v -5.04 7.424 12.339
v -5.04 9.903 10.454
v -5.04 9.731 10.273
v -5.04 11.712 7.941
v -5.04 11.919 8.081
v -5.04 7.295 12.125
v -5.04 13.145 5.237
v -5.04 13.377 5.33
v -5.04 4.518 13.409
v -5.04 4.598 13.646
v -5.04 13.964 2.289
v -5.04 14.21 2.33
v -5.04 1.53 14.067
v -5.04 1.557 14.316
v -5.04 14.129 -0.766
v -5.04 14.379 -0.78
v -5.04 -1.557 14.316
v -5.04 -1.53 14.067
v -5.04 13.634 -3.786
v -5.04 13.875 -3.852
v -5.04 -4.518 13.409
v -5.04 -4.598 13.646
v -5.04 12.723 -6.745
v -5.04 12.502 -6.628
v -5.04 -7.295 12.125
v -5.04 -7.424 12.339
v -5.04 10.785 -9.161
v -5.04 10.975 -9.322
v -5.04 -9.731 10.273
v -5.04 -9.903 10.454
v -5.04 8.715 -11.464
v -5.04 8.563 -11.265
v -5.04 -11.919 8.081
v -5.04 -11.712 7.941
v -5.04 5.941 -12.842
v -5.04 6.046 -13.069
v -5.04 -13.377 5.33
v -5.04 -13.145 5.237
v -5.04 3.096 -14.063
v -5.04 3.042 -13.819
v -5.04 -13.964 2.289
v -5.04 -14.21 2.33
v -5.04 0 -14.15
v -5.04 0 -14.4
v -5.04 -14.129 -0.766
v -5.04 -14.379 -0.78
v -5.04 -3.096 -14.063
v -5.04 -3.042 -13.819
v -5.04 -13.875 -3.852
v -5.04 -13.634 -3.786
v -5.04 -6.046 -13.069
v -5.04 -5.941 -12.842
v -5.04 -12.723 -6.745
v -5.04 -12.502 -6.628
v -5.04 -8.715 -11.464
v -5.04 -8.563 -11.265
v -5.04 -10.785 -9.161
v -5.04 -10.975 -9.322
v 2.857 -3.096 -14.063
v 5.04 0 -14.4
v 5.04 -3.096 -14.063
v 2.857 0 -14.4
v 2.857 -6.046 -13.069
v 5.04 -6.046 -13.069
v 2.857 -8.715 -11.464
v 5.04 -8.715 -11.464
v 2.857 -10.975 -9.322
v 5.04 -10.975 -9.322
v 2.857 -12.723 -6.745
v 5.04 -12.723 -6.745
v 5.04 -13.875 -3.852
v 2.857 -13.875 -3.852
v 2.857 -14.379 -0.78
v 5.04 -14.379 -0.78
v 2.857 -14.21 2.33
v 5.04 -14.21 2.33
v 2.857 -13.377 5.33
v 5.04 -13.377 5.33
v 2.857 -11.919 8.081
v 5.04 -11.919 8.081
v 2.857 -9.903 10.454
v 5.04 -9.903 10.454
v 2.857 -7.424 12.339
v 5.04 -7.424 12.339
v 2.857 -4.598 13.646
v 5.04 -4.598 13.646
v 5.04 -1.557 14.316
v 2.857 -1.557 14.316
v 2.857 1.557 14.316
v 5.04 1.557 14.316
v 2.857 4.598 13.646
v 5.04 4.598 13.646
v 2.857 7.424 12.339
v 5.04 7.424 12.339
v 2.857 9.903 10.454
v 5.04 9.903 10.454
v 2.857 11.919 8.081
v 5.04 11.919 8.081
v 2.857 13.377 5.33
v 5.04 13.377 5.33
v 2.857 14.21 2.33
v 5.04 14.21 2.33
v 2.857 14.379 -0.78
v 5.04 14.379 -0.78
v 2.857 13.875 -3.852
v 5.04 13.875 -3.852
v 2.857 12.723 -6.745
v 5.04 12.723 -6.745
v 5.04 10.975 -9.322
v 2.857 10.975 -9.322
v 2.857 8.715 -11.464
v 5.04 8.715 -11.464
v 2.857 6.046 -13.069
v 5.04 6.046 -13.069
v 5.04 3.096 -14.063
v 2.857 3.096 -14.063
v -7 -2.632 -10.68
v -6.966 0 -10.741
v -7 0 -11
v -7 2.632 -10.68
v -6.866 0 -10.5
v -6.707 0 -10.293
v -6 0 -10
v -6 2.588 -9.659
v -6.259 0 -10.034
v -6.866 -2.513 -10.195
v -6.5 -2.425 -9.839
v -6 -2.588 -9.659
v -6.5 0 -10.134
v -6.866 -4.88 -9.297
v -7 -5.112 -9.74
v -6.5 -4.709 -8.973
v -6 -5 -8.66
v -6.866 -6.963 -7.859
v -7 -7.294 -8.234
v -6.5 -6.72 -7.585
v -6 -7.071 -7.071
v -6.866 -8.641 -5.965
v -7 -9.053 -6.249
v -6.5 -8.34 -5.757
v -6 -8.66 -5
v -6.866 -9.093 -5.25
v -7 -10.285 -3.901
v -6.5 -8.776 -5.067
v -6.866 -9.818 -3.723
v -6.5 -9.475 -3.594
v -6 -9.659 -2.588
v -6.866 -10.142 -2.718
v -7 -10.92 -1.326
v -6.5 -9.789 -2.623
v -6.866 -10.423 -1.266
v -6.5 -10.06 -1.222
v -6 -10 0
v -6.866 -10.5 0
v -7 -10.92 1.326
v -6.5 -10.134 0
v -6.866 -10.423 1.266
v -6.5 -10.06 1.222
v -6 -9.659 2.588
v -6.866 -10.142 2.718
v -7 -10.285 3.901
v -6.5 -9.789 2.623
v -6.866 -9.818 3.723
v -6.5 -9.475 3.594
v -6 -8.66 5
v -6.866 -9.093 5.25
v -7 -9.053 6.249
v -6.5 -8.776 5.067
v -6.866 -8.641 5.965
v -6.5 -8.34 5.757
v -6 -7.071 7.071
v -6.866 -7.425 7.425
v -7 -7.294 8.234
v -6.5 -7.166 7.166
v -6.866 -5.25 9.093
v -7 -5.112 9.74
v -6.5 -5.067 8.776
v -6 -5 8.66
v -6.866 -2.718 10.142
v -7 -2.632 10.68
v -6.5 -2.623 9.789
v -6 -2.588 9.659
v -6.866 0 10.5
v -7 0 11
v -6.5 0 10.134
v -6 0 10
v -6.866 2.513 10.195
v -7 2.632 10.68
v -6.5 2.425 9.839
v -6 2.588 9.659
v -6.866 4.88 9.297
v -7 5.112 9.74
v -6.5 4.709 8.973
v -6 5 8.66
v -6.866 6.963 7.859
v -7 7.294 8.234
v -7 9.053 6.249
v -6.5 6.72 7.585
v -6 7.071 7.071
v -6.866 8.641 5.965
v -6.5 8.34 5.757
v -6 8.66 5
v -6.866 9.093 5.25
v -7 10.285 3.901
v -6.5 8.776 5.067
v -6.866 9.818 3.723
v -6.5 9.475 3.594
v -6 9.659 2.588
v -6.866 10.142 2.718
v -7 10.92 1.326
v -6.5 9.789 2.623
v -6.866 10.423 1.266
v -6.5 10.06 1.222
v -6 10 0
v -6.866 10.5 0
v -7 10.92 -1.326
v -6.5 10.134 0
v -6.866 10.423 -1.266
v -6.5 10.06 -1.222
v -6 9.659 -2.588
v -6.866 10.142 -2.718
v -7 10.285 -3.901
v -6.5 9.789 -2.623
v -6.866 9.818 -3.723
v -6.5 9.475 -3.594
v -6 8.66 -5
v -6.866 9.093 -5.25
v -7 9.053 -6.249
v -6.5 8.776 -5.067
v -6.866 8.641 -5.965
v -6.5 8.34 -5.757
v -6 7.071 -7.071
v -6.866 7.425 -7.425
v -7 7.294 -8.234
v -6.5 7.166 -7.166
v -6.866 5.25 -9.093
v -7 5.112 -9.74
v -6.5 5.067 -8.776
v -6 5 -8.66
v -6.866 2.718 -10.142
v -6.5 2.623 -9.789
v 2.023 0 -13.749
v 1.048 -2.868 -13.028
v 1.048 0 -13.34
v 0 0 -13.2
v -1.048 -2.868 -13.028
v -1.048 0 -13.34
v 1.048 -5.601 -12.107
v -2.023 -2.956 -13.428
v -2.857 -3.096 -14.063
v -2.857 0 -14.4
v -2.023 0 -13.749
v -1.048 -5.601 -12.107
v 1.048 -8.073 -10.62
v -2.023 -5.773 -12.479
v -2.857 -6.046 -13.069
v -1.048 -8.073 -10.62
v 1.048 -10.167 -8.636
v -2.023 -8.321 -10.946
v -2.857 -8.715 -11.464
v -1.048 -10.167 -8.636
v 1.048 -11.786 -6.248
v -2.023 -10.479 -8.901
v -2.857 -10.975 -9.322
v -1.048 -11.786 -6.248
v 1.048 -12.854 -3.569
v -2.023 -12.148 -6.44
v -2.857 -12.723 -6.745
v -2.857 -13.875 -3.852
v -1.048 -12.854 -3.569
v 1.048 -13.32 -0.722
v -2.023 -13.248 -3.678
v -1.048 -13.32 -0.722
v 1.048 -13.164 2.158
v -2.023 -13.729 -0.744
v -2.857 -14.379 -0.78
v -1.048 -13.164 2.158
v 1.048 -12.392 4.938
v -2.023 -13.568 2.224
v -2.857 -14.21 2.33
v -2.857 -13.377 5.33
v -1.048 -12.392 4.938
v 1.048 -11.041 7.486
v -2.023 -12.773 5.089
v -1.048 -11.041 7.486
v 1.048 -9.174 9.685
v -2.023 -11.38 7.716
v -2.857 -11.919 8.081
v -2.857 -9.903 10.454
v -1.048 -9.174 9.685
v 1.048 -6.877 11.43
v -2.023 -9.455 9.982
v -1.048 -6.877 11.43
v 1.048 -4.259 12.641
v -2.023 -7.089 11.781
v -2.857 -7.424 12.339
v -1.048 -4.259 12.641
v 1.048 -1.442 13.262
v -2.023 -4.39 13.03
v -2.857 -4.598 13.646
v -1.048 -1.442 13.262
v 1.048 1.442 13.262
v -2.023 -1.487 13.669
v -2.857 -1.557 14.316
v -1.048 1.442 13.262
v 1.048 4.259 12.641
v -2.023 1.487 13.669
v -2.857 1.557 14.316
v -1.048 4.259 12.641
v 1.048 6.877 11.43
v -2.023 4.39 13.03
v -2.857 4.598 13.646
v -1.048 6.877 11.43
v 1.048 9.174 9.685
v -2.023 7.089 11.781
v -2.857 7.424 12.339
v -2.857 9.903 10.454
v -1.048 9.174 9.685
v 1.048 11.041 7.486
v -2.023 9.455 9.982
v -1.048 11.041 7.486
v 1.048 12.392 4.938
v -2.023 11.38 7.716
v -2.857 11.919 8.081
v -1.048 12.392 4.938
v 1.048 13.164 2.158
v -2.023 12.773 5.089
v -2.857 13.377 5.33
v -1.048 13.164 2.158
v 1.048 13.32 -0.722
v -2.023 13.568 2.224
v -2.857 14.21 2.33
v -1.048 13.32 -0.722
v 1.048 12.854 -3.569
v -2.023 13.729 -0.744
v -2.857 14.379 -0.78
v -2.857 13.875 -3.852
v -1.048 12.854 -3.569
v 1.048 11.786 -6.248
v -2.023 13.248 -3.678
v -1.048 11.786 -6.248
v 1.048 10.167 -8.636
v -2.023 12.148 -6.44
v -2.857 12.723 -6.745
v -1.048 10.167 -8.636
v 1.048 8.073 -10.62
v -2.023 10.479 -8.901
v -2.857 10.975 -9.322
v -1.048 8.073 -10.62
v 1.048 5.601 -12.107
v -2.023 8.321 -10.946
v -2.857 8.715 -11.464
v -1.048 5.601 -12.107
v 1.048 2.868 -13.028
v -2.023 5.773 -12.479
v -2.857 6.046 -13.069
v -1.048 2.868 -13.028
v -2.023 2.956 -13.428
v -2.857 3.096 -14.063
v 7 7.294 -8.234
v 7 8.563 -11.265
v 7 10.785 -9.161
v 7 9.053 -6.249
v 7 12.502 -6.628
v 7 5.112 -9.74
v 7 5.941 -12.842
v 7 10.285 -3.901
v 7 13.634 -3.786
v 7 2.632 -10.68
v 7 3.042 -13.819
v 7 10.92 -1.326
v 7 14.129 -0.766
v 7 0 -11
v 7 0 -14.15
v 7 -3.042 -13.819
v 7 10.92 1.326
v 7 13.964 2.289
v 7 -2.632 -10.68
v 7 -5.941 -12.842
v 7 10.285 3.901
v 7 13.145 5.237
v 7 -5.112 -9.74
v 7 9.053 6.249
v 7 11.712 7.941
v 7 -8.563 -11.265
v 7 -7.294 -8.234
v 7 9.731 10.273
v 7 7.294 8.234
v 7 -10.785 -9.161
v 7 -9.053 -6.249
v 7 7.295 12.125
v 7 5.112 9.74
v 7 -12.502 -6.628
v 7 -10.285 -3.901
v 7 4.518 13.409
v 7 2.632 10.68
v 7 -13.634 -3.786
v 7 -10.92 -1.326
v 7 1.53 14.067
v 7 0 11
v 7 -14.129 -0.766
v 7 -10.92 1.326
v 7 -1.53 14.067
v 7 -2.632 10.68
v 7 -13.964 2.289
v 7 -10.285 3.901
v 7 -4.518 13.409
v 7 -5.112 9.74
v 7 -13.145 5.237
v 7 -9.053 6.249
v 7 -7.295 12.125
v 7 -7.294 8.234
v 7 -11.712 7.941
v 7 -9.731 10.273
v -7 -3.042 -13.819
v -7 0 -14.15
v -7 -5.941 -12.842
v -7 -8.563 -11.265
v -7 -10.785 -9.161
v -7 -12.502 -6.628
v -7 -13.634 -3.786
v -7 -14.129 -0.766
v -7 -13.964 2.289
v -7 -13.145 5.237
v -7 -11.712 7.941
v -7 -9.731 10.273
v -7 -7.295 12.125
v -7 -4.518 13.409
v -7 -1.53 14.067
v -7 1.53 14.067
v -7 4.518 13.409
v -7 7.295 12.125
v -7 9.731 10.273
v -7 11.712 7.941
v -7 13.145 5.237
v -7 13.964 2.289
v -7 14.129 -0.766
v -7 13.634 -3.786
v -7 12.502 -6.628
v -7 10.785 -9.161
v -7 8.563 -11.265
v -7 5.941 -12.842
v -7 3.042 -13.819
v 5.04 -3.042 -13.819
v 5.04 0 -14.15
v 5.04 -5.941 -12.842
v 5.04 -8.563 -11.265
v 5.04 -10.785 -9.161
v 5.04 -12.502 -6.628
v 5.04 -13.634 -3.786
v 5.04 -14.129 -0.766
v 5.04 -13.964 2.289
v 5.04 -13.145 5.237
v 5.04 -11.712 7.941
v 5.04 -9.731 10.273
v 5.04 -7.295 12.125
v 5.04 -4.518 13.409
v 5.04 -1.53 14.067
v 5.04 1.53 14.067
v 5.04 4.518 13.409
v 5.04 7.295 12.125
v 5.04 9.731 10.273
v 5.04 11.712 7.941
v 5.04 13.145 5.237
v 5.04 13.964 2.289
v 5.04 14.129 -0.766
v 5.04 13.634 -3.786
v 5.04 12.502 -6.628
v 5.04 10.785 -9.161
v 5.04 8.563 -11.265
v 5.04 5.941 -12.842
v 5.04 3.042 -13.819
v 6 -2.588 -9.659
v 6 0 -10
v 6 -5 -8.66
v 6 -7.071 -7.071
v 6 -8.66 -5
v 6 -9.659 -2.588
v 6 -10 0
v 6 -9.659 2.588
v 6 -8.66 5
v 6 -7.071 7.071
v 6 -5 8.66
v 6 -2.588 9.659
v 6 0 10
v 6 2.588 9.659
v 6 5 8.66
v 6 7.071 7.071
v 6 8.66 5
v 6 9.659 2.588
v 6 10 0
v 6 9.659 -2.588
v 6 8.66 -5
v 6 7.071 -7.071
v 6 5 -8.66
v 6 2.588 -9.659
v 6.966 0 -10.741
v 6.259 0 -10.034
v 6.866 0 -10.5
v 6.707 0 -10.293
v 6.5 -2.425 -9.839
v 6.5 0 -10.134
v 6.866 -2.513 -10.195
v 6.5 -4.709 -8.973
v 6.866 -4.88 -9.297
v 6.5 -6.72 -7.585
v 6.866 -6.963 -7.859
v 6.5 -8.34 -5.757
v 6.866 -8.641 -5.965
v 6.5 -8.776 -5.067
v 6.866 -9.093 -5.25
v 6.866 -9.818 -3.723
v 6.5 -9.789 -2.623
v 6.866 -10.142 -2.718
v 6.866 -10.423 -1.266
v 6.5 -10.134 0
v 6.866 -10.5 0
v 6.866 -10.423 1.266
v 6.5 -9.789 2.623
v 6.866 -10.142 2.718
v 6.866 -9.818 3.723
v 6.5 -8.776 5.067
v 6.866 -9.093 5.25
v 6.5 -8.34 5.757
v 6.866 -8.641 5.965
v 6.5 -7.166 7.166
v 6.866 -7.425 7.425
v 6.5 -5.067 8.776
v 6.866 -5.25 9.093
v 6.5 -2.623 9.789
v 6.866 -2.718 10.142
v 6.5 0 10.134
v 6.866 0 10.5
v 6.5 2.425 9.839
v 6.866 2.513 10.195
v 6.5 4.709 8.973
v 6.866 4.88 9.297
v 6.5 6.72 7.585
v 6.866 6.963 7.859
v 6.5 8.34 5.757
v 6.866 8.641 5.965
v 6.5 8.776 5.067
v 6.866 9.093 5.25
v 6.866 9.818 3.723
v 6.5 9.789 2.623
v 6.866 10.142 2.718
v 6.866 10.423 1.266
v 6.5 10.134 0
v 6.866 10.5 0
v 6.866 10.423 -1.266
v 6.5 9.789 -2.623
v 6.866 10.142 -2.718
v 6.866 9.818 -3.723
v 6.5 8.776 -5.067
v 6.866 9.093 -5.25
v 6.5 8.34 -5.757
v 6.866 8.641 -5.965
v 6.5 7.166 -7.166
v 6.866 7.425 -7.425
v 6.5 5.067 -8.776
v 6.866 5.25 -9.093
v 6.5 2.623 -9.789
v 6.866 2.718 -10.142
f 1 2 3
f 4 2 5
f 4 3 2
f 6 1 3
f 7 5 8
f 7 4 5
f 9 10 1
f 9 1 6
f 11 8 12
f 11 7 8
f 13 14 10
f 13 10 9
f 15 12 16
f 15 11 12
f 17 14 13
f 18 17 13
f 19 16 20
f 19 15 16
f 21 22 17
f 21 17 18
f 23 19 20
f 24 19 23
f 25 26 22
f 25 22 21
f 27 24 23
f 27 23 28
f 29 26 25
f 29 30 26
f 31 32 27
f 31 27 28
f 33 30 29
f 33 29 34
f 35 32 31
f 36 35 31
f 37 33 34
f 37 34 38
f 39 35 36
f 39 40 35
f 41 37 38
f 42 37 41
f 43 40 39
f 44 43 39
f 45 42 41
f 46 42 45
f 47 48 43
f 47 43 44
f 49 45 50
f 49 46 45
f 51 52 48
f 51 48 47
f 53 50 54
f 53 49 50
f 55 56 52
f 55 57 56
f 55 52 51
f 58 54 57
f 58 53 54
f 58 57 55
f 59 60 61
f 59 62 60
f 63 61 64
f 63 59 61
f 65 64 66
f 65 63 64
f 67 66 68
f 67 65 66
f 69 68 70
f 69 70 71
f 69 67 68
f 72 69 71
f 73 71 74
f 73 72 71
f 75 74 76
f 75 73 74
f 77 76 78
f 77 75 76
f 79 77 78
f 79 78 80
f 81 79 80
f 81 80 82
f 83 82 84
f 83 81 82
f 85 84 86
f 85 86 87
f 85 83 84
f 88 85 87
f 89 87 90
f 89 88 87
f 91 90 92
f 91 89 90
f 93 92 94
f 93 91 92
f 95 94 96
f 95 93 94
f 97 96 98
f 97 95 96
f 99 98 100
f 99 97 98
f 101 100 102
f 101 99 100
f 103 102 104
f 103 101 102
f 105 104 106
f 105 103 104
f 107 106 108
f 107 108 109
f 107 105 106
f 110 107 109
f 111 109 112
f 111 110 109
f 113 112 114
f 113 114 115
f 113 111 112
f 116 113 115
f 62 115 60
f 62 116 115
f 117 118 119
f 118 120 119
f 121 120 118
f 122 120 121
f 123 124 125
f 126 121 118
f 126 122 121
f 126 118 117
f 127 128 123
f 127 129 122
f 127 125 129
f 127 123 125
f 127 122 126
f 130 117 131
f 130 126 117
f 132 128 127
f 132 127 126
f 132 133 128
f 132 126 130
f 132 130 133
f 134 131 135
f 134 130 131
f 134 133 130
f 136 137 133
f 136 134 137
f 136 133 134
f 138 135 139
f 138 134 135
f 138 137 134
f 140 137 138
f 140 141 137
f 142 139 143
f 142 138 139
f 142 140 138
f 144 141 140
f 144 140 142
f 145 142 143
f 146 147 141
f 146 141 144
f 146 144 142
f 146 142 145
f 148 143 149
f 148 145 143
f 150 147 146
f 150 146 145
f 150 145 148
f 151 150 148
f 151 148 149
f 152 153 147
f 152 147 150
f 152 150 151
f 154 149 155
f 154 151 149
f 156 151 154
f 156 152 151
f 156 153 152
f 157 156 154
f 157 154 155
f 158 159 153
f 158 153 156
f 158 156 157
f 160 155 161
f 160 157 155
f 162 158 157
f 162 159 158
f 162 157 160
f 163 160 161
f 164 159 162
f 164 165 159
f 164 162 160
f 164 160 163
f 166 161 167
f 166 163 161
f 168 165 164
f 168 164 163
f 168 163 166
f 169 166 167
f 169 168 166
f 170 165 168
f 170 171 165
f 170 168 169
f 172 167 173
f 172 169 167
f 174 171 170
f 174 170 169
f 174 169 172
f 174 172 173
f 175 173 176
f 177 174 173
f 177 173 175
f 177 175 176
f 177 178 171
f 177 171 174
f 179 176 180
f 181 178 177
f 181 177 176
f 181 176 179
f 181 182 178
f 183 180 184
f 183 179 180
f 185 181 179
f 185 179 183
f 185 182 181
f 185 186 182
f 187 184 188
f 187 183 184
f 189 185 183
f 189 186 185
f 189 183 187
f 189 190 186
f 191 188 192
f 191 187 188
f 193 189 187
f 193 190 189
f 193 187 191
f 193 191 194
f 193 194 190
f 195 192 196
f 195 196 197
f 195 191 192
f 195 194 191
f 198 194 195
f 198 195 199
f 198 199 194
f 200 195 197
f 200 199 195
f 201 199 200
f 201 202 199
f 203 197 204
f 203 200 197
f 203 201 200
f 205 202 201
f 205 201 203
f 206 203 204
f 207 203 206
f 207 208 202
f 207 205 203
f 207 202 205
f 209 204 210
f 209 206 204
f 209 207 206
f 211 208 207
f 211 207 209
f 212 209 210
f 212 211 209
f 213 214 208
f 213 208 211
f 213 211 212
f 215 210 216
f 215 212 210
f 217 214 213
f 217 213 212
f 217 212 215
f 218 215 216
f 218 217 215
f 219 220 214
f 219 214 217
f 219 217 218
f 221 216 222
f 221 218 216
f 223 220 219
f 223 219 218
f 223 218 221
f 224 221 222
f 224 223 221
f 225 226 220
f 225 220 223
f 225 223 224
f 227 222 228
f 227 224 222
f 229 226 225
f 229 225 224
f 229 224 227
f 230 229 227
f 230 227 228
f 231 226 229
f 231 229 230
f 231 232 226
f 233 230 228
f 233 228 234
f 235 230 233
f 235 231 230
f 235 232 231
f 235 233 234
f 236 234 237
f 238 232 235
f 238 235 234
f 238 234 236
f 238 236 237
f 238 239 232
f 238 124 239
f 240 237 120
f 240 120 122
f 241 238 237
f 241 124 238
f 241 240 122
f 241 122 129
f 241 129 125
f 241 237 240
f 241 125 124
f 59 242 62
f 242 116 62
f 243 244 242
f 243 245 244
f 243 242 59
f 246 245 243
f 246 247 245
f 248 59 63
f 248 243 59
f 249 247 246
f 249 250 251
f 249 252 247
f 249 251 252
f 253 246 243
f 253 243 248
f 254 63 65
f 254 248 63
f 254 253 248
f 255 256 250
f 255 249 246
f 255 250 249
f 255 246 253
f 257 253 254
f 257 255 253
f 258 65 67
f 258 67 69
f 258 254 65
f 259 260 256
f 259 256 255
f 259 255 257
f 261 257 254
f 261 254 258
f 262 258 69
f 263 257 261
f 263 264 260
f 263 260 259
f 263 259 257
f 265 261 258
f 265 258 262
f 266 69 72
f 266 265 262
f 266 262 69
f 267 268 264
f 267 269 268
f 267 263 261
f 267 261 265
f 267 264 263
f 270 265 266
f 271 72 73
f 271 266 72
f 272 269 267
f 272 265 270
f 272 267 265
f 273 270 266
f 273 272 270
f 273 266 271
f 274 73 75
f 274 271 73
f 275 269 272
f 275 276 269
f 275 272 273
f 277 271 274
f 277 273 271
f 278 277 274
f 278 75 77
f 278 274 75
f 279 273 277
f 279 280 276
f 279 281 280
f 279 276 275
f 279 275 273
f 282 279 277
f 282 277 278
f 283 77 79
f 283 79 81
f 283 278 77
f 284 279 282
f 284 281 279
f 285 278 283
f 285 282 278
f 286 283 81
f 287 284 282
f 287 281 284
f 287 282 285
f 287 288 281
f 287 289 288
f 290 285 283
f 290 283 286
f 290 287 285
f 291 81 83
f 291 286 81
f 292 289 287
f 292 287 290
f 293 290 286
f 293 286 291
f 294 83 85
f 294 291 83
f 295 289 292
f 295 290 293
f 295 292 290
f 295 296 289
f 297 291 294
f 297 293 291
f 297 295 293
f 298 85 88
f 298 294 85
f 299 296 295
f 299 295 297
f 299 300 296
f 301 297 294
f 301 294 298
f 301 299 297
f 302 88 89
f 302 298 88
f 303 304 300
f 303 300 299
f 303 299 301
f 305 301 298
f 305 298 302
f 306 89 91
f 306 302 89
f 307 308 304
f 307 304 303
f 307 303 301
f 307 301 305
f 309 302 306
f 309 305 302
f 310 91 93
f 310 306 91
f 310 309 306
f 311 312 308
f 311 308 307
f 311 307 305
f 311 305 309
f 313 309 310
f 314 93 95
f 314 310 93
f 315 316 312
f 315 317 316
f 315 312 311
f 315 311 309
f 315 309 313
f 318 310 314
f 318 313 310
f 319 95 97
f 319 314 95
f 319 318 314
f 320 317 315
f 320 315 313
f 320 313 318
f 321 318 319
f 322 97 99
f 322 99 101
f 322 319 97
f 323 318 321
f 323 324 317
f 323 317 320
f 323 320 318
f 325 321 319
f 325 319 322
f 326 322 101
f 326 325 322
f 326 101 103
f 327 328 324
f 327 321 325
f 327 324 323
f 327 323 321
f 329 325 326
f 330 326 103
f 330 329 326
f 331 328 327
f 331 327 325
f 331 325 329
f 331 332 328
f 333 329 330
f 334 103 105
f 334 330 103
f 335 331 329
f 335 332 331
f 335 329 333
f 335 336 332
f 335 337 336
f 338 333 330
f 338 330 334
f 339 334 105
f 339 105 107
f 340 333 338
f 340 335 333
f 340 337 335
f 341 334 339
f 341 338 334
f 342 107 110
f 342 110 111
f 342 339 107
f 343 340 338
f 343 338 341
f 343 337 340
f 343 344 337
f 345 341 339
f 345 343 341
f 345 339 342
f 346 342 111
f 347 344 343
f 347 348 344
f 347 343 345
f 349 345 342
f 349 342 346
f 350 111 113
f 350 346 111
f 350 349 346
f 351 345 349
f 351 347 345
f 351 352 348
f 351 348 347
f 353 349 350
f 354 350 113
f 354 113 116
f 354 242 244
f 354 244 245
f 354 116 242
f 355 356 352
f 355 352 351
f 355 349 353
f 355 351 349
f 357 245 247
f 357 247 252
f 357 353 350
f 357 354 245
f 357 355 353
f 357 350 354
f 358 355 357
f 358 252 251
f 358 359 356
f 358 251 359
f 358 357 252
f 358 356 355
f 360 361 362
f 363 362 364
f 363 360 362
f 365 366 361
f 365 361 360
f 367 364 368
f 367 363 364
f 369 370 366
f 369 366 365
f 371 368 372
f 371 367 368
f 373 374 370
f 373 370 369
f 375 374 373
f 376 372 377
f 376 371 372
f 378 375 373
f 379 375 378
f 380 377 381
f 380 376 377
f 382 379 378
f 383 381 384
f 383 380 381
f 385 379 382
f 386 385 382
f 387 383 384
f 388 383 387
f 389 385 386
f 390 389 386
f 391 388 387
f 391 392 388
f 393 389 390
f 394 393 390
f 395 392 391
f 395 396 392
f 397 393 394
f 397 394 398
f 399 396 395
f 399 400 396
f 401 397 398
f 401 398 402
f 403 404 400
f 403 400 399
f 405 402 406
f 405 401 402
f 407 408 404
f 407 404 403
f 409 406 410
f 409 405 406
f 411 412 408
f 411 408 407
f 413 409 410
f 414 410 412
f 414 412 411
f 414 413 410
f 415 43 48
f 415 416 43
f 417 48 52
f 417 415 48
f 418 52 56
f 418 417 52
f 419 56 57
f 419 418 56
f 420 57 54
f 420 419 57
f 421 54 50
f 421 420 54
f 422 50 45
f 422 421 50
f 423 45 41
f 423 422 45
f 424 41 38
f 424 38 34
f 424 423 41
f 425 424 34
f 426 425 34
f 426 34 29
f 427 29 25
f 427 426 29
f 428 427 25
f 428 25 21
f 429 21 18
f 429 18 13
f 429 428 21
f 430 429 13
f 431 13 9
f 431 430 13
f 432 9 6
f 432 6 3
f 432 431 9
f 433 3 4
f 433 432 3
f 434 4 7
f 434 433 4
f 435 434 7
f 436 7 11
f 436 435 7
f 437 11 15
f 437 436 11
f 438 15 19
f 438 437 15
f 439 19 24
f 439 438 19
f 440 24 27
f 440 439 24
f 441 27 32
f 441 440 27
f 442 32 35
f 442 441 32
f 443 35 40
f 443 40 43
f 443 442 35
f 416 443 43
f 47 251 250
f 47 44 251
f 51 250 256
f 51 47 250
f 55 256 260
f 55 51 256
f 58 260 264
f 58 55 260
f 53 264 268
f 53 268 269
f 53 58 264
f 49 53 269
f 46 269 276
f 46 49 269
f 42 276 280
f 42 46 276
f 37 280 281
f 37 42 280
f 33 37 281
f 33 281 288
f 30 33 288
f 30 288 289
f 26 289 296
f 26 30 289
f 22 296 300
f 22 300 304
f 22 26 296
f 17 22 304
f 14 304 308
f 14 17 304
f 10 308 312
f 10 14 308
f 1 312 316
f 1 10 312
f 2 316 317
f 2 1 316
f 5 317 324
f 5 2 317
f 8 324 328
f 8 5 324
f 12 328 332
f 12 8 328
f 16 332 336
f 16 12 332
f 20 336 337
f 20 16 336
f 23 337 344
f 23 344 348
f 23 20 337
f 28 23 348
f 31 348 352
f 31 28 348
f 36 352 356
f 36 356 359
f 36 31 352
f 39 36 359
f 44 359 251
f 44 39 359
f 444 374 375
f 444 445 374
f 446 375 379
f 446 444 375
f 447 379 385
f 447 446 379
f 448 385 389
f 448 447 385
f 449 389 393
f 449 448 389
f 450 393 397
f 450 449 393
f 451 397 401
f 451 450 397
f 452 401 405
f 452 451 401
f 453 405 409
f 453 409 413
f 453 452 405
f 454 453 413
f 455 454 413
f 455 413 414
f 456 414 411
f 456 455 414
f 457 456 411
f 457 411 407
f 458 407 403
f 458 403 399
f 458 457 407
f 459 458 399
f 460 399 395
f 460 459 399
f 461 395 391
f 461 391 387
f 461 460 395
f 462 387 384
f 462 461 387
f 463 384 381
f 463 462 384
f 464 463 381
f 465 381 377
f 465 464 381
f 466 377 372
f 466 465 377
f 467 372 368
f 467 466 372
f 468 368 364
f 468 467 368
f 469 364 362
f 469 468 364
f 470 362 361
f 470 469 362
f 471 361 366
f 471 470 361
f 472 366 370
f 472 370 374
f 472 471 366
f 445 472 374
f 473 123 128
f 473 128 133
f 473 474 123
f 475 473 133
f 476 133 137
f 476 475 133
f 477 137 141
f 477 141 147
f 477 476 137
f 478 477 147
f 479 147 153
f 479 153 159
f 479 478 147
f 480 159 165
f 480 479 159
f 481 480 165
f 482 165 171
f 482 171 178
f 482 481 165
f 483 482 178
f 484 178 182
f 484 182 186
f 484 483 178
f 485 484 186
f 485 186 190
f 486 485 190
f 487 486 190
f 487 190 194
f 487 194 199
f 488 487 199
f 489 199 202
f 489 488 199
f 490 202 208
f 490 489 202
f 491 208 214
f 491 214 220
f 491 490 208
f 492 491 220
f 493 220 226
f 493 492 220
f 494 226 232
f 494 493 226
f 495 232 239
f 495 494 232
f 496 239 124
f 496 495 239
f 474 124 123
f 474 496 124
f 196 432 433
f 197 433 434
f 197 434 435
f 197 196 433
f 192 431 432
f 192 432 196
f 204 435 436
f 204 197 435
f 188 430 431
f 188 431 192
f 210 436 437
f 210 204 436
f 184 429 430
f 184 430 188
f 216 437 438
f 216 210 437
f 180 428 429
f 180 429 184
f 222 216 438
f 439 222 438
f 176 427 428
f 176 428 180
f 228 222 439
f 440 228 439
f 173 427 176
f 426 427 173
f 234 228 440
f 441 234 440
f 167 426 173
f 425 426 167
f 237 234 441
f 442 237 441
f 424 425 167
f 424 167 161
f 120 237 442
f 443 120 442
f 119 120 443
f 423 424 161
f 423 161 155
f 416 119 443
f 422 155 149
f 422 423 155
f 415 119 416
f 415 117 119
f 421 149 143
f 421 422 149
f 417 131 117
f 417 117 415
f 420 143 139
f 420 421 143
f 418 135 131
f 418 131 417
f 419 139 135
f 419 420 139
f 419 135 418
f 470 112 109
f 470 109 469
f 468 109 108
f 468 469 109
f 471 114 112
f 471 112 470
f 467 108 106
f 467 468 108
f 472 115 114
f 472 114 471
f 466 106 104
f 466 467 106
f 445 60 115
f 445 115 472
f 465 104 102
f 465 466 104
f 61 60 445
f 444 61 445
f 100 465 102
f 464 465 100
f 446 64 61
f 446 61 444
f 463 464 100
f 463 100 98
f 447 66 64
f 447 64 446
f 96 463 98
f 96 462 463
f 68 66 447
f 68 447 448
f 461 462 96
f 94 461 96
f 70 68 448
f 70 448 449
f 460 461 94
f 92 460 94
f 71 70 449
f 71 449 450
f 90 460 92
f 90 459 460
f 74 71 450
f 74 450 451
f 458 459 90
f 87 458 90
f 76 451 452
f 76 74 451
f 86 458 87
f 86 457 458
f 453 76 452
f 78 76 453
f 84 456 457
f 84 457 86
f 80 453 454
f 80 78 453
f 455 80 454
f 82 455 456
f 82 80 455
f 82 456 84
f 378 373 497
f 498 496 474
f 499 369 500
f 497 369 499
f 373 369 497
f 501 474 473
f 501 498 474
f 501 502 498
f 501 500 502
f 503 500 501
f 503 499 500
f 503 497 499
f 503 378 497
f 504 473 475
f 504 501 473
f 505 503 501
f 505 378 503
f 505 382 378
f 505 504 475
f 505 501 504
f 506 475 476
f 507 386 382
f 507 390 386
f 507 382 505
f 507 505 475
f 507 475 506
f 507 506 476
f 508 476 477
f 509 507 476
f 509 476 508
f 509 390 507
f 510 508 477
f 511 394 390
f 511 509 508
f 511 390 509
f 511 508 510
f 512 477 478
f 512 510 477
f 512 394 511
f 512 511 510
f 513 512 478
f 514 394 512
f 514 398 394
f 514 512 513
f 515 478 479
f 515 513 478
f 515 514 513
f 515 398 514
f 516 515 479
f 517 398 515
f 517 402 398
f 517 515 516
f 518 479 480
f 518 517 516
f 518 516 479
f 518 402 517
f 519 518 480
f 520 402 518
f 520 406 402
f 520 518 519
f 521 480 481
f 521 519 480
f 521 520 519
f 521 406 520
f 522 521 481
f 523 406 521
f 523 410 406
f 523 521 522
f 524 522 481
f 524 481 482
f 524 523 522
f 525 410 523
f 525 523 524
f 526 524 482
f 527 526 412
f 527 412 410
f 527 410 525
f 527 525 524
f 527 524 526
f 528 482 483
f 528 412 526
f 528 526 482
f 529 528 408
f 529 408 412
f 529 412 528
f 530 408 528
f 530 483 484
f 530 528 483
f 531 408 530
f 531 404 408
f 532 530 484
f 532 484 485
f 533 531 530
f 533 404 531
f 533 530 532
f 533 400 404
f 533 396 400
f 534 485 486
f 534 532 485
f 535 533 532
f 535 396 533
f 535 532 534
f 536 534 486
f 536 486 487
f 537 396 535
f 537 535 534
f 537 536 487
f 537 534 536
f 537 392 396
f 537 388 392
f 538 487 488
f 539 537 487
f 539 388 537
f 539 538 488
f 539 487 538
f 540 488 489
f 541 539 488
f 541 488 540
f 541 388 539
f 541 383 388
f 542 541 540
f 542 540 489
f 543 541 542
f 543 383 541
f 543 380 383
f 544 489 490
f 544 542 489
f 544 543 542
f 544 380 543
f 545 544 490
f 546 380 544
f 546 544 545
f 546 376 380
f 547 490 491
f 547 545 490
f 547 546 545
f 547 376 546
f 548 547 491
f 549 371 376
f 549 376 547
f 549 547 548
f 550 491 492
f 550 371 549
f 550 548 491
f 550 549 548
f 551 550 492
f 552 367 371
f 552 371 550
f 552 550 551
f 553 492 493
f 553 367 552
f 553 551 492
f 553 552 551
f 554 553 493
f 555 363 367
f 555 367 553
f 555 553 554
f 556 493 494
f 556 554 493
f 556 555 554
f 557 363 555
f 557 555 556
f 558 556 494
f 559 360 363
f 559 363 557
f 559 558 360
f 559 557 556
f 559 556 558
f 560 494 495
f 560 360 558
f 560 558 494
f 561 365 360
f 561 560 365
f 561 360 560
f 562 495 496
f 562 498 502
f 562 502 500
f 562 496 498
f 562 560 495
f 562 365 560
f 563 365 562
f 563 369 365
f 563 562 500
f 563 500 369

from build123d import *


with BuildPart() as part:
    # Sketch1 → Revolve1 (revolve)
    with BuildSketch(Plane.XY, mode=Mode.PRIVATE) as revolve1_sk:
        with BuildLine():
            Line((-6, 10), (6, 10))
            ThreePointArc((6, 10), (6.707106781, 10.292893219), (7, 11))
            Line((7, 11), (7, 14.15))
            Line((7, 14.15), (5.04, 14.15))
            Line((5.04, 14.15), (5.04, 14.4))
            Line((5.04, 14.4), (2.856571371, 14.4))
            ThreePointArc((2.856571371, 14.4), (0, 13.2), (-2.856571371, 14.4))
            Line((-2.856571371, 14.4), (-5.04, 14.4))
            Line((-5.04, 14.4), (-5.04, 14.15))
            Line((-5.04, 14.15), (-7, 14.15))
            Line((-7, 14.15), (-7, 11))
            ThreePointArc((-7, 11), (-6.707106781, 10.292893219), (-6, 10))
        make_face()
    revolve(revolve1_sk.sketch.rotate(Axis((0, 0, 0), (-1, 0, 0)), 90), axis=Axis((0, 0, 0), (-1, 0, 0)))


solid = part.part
